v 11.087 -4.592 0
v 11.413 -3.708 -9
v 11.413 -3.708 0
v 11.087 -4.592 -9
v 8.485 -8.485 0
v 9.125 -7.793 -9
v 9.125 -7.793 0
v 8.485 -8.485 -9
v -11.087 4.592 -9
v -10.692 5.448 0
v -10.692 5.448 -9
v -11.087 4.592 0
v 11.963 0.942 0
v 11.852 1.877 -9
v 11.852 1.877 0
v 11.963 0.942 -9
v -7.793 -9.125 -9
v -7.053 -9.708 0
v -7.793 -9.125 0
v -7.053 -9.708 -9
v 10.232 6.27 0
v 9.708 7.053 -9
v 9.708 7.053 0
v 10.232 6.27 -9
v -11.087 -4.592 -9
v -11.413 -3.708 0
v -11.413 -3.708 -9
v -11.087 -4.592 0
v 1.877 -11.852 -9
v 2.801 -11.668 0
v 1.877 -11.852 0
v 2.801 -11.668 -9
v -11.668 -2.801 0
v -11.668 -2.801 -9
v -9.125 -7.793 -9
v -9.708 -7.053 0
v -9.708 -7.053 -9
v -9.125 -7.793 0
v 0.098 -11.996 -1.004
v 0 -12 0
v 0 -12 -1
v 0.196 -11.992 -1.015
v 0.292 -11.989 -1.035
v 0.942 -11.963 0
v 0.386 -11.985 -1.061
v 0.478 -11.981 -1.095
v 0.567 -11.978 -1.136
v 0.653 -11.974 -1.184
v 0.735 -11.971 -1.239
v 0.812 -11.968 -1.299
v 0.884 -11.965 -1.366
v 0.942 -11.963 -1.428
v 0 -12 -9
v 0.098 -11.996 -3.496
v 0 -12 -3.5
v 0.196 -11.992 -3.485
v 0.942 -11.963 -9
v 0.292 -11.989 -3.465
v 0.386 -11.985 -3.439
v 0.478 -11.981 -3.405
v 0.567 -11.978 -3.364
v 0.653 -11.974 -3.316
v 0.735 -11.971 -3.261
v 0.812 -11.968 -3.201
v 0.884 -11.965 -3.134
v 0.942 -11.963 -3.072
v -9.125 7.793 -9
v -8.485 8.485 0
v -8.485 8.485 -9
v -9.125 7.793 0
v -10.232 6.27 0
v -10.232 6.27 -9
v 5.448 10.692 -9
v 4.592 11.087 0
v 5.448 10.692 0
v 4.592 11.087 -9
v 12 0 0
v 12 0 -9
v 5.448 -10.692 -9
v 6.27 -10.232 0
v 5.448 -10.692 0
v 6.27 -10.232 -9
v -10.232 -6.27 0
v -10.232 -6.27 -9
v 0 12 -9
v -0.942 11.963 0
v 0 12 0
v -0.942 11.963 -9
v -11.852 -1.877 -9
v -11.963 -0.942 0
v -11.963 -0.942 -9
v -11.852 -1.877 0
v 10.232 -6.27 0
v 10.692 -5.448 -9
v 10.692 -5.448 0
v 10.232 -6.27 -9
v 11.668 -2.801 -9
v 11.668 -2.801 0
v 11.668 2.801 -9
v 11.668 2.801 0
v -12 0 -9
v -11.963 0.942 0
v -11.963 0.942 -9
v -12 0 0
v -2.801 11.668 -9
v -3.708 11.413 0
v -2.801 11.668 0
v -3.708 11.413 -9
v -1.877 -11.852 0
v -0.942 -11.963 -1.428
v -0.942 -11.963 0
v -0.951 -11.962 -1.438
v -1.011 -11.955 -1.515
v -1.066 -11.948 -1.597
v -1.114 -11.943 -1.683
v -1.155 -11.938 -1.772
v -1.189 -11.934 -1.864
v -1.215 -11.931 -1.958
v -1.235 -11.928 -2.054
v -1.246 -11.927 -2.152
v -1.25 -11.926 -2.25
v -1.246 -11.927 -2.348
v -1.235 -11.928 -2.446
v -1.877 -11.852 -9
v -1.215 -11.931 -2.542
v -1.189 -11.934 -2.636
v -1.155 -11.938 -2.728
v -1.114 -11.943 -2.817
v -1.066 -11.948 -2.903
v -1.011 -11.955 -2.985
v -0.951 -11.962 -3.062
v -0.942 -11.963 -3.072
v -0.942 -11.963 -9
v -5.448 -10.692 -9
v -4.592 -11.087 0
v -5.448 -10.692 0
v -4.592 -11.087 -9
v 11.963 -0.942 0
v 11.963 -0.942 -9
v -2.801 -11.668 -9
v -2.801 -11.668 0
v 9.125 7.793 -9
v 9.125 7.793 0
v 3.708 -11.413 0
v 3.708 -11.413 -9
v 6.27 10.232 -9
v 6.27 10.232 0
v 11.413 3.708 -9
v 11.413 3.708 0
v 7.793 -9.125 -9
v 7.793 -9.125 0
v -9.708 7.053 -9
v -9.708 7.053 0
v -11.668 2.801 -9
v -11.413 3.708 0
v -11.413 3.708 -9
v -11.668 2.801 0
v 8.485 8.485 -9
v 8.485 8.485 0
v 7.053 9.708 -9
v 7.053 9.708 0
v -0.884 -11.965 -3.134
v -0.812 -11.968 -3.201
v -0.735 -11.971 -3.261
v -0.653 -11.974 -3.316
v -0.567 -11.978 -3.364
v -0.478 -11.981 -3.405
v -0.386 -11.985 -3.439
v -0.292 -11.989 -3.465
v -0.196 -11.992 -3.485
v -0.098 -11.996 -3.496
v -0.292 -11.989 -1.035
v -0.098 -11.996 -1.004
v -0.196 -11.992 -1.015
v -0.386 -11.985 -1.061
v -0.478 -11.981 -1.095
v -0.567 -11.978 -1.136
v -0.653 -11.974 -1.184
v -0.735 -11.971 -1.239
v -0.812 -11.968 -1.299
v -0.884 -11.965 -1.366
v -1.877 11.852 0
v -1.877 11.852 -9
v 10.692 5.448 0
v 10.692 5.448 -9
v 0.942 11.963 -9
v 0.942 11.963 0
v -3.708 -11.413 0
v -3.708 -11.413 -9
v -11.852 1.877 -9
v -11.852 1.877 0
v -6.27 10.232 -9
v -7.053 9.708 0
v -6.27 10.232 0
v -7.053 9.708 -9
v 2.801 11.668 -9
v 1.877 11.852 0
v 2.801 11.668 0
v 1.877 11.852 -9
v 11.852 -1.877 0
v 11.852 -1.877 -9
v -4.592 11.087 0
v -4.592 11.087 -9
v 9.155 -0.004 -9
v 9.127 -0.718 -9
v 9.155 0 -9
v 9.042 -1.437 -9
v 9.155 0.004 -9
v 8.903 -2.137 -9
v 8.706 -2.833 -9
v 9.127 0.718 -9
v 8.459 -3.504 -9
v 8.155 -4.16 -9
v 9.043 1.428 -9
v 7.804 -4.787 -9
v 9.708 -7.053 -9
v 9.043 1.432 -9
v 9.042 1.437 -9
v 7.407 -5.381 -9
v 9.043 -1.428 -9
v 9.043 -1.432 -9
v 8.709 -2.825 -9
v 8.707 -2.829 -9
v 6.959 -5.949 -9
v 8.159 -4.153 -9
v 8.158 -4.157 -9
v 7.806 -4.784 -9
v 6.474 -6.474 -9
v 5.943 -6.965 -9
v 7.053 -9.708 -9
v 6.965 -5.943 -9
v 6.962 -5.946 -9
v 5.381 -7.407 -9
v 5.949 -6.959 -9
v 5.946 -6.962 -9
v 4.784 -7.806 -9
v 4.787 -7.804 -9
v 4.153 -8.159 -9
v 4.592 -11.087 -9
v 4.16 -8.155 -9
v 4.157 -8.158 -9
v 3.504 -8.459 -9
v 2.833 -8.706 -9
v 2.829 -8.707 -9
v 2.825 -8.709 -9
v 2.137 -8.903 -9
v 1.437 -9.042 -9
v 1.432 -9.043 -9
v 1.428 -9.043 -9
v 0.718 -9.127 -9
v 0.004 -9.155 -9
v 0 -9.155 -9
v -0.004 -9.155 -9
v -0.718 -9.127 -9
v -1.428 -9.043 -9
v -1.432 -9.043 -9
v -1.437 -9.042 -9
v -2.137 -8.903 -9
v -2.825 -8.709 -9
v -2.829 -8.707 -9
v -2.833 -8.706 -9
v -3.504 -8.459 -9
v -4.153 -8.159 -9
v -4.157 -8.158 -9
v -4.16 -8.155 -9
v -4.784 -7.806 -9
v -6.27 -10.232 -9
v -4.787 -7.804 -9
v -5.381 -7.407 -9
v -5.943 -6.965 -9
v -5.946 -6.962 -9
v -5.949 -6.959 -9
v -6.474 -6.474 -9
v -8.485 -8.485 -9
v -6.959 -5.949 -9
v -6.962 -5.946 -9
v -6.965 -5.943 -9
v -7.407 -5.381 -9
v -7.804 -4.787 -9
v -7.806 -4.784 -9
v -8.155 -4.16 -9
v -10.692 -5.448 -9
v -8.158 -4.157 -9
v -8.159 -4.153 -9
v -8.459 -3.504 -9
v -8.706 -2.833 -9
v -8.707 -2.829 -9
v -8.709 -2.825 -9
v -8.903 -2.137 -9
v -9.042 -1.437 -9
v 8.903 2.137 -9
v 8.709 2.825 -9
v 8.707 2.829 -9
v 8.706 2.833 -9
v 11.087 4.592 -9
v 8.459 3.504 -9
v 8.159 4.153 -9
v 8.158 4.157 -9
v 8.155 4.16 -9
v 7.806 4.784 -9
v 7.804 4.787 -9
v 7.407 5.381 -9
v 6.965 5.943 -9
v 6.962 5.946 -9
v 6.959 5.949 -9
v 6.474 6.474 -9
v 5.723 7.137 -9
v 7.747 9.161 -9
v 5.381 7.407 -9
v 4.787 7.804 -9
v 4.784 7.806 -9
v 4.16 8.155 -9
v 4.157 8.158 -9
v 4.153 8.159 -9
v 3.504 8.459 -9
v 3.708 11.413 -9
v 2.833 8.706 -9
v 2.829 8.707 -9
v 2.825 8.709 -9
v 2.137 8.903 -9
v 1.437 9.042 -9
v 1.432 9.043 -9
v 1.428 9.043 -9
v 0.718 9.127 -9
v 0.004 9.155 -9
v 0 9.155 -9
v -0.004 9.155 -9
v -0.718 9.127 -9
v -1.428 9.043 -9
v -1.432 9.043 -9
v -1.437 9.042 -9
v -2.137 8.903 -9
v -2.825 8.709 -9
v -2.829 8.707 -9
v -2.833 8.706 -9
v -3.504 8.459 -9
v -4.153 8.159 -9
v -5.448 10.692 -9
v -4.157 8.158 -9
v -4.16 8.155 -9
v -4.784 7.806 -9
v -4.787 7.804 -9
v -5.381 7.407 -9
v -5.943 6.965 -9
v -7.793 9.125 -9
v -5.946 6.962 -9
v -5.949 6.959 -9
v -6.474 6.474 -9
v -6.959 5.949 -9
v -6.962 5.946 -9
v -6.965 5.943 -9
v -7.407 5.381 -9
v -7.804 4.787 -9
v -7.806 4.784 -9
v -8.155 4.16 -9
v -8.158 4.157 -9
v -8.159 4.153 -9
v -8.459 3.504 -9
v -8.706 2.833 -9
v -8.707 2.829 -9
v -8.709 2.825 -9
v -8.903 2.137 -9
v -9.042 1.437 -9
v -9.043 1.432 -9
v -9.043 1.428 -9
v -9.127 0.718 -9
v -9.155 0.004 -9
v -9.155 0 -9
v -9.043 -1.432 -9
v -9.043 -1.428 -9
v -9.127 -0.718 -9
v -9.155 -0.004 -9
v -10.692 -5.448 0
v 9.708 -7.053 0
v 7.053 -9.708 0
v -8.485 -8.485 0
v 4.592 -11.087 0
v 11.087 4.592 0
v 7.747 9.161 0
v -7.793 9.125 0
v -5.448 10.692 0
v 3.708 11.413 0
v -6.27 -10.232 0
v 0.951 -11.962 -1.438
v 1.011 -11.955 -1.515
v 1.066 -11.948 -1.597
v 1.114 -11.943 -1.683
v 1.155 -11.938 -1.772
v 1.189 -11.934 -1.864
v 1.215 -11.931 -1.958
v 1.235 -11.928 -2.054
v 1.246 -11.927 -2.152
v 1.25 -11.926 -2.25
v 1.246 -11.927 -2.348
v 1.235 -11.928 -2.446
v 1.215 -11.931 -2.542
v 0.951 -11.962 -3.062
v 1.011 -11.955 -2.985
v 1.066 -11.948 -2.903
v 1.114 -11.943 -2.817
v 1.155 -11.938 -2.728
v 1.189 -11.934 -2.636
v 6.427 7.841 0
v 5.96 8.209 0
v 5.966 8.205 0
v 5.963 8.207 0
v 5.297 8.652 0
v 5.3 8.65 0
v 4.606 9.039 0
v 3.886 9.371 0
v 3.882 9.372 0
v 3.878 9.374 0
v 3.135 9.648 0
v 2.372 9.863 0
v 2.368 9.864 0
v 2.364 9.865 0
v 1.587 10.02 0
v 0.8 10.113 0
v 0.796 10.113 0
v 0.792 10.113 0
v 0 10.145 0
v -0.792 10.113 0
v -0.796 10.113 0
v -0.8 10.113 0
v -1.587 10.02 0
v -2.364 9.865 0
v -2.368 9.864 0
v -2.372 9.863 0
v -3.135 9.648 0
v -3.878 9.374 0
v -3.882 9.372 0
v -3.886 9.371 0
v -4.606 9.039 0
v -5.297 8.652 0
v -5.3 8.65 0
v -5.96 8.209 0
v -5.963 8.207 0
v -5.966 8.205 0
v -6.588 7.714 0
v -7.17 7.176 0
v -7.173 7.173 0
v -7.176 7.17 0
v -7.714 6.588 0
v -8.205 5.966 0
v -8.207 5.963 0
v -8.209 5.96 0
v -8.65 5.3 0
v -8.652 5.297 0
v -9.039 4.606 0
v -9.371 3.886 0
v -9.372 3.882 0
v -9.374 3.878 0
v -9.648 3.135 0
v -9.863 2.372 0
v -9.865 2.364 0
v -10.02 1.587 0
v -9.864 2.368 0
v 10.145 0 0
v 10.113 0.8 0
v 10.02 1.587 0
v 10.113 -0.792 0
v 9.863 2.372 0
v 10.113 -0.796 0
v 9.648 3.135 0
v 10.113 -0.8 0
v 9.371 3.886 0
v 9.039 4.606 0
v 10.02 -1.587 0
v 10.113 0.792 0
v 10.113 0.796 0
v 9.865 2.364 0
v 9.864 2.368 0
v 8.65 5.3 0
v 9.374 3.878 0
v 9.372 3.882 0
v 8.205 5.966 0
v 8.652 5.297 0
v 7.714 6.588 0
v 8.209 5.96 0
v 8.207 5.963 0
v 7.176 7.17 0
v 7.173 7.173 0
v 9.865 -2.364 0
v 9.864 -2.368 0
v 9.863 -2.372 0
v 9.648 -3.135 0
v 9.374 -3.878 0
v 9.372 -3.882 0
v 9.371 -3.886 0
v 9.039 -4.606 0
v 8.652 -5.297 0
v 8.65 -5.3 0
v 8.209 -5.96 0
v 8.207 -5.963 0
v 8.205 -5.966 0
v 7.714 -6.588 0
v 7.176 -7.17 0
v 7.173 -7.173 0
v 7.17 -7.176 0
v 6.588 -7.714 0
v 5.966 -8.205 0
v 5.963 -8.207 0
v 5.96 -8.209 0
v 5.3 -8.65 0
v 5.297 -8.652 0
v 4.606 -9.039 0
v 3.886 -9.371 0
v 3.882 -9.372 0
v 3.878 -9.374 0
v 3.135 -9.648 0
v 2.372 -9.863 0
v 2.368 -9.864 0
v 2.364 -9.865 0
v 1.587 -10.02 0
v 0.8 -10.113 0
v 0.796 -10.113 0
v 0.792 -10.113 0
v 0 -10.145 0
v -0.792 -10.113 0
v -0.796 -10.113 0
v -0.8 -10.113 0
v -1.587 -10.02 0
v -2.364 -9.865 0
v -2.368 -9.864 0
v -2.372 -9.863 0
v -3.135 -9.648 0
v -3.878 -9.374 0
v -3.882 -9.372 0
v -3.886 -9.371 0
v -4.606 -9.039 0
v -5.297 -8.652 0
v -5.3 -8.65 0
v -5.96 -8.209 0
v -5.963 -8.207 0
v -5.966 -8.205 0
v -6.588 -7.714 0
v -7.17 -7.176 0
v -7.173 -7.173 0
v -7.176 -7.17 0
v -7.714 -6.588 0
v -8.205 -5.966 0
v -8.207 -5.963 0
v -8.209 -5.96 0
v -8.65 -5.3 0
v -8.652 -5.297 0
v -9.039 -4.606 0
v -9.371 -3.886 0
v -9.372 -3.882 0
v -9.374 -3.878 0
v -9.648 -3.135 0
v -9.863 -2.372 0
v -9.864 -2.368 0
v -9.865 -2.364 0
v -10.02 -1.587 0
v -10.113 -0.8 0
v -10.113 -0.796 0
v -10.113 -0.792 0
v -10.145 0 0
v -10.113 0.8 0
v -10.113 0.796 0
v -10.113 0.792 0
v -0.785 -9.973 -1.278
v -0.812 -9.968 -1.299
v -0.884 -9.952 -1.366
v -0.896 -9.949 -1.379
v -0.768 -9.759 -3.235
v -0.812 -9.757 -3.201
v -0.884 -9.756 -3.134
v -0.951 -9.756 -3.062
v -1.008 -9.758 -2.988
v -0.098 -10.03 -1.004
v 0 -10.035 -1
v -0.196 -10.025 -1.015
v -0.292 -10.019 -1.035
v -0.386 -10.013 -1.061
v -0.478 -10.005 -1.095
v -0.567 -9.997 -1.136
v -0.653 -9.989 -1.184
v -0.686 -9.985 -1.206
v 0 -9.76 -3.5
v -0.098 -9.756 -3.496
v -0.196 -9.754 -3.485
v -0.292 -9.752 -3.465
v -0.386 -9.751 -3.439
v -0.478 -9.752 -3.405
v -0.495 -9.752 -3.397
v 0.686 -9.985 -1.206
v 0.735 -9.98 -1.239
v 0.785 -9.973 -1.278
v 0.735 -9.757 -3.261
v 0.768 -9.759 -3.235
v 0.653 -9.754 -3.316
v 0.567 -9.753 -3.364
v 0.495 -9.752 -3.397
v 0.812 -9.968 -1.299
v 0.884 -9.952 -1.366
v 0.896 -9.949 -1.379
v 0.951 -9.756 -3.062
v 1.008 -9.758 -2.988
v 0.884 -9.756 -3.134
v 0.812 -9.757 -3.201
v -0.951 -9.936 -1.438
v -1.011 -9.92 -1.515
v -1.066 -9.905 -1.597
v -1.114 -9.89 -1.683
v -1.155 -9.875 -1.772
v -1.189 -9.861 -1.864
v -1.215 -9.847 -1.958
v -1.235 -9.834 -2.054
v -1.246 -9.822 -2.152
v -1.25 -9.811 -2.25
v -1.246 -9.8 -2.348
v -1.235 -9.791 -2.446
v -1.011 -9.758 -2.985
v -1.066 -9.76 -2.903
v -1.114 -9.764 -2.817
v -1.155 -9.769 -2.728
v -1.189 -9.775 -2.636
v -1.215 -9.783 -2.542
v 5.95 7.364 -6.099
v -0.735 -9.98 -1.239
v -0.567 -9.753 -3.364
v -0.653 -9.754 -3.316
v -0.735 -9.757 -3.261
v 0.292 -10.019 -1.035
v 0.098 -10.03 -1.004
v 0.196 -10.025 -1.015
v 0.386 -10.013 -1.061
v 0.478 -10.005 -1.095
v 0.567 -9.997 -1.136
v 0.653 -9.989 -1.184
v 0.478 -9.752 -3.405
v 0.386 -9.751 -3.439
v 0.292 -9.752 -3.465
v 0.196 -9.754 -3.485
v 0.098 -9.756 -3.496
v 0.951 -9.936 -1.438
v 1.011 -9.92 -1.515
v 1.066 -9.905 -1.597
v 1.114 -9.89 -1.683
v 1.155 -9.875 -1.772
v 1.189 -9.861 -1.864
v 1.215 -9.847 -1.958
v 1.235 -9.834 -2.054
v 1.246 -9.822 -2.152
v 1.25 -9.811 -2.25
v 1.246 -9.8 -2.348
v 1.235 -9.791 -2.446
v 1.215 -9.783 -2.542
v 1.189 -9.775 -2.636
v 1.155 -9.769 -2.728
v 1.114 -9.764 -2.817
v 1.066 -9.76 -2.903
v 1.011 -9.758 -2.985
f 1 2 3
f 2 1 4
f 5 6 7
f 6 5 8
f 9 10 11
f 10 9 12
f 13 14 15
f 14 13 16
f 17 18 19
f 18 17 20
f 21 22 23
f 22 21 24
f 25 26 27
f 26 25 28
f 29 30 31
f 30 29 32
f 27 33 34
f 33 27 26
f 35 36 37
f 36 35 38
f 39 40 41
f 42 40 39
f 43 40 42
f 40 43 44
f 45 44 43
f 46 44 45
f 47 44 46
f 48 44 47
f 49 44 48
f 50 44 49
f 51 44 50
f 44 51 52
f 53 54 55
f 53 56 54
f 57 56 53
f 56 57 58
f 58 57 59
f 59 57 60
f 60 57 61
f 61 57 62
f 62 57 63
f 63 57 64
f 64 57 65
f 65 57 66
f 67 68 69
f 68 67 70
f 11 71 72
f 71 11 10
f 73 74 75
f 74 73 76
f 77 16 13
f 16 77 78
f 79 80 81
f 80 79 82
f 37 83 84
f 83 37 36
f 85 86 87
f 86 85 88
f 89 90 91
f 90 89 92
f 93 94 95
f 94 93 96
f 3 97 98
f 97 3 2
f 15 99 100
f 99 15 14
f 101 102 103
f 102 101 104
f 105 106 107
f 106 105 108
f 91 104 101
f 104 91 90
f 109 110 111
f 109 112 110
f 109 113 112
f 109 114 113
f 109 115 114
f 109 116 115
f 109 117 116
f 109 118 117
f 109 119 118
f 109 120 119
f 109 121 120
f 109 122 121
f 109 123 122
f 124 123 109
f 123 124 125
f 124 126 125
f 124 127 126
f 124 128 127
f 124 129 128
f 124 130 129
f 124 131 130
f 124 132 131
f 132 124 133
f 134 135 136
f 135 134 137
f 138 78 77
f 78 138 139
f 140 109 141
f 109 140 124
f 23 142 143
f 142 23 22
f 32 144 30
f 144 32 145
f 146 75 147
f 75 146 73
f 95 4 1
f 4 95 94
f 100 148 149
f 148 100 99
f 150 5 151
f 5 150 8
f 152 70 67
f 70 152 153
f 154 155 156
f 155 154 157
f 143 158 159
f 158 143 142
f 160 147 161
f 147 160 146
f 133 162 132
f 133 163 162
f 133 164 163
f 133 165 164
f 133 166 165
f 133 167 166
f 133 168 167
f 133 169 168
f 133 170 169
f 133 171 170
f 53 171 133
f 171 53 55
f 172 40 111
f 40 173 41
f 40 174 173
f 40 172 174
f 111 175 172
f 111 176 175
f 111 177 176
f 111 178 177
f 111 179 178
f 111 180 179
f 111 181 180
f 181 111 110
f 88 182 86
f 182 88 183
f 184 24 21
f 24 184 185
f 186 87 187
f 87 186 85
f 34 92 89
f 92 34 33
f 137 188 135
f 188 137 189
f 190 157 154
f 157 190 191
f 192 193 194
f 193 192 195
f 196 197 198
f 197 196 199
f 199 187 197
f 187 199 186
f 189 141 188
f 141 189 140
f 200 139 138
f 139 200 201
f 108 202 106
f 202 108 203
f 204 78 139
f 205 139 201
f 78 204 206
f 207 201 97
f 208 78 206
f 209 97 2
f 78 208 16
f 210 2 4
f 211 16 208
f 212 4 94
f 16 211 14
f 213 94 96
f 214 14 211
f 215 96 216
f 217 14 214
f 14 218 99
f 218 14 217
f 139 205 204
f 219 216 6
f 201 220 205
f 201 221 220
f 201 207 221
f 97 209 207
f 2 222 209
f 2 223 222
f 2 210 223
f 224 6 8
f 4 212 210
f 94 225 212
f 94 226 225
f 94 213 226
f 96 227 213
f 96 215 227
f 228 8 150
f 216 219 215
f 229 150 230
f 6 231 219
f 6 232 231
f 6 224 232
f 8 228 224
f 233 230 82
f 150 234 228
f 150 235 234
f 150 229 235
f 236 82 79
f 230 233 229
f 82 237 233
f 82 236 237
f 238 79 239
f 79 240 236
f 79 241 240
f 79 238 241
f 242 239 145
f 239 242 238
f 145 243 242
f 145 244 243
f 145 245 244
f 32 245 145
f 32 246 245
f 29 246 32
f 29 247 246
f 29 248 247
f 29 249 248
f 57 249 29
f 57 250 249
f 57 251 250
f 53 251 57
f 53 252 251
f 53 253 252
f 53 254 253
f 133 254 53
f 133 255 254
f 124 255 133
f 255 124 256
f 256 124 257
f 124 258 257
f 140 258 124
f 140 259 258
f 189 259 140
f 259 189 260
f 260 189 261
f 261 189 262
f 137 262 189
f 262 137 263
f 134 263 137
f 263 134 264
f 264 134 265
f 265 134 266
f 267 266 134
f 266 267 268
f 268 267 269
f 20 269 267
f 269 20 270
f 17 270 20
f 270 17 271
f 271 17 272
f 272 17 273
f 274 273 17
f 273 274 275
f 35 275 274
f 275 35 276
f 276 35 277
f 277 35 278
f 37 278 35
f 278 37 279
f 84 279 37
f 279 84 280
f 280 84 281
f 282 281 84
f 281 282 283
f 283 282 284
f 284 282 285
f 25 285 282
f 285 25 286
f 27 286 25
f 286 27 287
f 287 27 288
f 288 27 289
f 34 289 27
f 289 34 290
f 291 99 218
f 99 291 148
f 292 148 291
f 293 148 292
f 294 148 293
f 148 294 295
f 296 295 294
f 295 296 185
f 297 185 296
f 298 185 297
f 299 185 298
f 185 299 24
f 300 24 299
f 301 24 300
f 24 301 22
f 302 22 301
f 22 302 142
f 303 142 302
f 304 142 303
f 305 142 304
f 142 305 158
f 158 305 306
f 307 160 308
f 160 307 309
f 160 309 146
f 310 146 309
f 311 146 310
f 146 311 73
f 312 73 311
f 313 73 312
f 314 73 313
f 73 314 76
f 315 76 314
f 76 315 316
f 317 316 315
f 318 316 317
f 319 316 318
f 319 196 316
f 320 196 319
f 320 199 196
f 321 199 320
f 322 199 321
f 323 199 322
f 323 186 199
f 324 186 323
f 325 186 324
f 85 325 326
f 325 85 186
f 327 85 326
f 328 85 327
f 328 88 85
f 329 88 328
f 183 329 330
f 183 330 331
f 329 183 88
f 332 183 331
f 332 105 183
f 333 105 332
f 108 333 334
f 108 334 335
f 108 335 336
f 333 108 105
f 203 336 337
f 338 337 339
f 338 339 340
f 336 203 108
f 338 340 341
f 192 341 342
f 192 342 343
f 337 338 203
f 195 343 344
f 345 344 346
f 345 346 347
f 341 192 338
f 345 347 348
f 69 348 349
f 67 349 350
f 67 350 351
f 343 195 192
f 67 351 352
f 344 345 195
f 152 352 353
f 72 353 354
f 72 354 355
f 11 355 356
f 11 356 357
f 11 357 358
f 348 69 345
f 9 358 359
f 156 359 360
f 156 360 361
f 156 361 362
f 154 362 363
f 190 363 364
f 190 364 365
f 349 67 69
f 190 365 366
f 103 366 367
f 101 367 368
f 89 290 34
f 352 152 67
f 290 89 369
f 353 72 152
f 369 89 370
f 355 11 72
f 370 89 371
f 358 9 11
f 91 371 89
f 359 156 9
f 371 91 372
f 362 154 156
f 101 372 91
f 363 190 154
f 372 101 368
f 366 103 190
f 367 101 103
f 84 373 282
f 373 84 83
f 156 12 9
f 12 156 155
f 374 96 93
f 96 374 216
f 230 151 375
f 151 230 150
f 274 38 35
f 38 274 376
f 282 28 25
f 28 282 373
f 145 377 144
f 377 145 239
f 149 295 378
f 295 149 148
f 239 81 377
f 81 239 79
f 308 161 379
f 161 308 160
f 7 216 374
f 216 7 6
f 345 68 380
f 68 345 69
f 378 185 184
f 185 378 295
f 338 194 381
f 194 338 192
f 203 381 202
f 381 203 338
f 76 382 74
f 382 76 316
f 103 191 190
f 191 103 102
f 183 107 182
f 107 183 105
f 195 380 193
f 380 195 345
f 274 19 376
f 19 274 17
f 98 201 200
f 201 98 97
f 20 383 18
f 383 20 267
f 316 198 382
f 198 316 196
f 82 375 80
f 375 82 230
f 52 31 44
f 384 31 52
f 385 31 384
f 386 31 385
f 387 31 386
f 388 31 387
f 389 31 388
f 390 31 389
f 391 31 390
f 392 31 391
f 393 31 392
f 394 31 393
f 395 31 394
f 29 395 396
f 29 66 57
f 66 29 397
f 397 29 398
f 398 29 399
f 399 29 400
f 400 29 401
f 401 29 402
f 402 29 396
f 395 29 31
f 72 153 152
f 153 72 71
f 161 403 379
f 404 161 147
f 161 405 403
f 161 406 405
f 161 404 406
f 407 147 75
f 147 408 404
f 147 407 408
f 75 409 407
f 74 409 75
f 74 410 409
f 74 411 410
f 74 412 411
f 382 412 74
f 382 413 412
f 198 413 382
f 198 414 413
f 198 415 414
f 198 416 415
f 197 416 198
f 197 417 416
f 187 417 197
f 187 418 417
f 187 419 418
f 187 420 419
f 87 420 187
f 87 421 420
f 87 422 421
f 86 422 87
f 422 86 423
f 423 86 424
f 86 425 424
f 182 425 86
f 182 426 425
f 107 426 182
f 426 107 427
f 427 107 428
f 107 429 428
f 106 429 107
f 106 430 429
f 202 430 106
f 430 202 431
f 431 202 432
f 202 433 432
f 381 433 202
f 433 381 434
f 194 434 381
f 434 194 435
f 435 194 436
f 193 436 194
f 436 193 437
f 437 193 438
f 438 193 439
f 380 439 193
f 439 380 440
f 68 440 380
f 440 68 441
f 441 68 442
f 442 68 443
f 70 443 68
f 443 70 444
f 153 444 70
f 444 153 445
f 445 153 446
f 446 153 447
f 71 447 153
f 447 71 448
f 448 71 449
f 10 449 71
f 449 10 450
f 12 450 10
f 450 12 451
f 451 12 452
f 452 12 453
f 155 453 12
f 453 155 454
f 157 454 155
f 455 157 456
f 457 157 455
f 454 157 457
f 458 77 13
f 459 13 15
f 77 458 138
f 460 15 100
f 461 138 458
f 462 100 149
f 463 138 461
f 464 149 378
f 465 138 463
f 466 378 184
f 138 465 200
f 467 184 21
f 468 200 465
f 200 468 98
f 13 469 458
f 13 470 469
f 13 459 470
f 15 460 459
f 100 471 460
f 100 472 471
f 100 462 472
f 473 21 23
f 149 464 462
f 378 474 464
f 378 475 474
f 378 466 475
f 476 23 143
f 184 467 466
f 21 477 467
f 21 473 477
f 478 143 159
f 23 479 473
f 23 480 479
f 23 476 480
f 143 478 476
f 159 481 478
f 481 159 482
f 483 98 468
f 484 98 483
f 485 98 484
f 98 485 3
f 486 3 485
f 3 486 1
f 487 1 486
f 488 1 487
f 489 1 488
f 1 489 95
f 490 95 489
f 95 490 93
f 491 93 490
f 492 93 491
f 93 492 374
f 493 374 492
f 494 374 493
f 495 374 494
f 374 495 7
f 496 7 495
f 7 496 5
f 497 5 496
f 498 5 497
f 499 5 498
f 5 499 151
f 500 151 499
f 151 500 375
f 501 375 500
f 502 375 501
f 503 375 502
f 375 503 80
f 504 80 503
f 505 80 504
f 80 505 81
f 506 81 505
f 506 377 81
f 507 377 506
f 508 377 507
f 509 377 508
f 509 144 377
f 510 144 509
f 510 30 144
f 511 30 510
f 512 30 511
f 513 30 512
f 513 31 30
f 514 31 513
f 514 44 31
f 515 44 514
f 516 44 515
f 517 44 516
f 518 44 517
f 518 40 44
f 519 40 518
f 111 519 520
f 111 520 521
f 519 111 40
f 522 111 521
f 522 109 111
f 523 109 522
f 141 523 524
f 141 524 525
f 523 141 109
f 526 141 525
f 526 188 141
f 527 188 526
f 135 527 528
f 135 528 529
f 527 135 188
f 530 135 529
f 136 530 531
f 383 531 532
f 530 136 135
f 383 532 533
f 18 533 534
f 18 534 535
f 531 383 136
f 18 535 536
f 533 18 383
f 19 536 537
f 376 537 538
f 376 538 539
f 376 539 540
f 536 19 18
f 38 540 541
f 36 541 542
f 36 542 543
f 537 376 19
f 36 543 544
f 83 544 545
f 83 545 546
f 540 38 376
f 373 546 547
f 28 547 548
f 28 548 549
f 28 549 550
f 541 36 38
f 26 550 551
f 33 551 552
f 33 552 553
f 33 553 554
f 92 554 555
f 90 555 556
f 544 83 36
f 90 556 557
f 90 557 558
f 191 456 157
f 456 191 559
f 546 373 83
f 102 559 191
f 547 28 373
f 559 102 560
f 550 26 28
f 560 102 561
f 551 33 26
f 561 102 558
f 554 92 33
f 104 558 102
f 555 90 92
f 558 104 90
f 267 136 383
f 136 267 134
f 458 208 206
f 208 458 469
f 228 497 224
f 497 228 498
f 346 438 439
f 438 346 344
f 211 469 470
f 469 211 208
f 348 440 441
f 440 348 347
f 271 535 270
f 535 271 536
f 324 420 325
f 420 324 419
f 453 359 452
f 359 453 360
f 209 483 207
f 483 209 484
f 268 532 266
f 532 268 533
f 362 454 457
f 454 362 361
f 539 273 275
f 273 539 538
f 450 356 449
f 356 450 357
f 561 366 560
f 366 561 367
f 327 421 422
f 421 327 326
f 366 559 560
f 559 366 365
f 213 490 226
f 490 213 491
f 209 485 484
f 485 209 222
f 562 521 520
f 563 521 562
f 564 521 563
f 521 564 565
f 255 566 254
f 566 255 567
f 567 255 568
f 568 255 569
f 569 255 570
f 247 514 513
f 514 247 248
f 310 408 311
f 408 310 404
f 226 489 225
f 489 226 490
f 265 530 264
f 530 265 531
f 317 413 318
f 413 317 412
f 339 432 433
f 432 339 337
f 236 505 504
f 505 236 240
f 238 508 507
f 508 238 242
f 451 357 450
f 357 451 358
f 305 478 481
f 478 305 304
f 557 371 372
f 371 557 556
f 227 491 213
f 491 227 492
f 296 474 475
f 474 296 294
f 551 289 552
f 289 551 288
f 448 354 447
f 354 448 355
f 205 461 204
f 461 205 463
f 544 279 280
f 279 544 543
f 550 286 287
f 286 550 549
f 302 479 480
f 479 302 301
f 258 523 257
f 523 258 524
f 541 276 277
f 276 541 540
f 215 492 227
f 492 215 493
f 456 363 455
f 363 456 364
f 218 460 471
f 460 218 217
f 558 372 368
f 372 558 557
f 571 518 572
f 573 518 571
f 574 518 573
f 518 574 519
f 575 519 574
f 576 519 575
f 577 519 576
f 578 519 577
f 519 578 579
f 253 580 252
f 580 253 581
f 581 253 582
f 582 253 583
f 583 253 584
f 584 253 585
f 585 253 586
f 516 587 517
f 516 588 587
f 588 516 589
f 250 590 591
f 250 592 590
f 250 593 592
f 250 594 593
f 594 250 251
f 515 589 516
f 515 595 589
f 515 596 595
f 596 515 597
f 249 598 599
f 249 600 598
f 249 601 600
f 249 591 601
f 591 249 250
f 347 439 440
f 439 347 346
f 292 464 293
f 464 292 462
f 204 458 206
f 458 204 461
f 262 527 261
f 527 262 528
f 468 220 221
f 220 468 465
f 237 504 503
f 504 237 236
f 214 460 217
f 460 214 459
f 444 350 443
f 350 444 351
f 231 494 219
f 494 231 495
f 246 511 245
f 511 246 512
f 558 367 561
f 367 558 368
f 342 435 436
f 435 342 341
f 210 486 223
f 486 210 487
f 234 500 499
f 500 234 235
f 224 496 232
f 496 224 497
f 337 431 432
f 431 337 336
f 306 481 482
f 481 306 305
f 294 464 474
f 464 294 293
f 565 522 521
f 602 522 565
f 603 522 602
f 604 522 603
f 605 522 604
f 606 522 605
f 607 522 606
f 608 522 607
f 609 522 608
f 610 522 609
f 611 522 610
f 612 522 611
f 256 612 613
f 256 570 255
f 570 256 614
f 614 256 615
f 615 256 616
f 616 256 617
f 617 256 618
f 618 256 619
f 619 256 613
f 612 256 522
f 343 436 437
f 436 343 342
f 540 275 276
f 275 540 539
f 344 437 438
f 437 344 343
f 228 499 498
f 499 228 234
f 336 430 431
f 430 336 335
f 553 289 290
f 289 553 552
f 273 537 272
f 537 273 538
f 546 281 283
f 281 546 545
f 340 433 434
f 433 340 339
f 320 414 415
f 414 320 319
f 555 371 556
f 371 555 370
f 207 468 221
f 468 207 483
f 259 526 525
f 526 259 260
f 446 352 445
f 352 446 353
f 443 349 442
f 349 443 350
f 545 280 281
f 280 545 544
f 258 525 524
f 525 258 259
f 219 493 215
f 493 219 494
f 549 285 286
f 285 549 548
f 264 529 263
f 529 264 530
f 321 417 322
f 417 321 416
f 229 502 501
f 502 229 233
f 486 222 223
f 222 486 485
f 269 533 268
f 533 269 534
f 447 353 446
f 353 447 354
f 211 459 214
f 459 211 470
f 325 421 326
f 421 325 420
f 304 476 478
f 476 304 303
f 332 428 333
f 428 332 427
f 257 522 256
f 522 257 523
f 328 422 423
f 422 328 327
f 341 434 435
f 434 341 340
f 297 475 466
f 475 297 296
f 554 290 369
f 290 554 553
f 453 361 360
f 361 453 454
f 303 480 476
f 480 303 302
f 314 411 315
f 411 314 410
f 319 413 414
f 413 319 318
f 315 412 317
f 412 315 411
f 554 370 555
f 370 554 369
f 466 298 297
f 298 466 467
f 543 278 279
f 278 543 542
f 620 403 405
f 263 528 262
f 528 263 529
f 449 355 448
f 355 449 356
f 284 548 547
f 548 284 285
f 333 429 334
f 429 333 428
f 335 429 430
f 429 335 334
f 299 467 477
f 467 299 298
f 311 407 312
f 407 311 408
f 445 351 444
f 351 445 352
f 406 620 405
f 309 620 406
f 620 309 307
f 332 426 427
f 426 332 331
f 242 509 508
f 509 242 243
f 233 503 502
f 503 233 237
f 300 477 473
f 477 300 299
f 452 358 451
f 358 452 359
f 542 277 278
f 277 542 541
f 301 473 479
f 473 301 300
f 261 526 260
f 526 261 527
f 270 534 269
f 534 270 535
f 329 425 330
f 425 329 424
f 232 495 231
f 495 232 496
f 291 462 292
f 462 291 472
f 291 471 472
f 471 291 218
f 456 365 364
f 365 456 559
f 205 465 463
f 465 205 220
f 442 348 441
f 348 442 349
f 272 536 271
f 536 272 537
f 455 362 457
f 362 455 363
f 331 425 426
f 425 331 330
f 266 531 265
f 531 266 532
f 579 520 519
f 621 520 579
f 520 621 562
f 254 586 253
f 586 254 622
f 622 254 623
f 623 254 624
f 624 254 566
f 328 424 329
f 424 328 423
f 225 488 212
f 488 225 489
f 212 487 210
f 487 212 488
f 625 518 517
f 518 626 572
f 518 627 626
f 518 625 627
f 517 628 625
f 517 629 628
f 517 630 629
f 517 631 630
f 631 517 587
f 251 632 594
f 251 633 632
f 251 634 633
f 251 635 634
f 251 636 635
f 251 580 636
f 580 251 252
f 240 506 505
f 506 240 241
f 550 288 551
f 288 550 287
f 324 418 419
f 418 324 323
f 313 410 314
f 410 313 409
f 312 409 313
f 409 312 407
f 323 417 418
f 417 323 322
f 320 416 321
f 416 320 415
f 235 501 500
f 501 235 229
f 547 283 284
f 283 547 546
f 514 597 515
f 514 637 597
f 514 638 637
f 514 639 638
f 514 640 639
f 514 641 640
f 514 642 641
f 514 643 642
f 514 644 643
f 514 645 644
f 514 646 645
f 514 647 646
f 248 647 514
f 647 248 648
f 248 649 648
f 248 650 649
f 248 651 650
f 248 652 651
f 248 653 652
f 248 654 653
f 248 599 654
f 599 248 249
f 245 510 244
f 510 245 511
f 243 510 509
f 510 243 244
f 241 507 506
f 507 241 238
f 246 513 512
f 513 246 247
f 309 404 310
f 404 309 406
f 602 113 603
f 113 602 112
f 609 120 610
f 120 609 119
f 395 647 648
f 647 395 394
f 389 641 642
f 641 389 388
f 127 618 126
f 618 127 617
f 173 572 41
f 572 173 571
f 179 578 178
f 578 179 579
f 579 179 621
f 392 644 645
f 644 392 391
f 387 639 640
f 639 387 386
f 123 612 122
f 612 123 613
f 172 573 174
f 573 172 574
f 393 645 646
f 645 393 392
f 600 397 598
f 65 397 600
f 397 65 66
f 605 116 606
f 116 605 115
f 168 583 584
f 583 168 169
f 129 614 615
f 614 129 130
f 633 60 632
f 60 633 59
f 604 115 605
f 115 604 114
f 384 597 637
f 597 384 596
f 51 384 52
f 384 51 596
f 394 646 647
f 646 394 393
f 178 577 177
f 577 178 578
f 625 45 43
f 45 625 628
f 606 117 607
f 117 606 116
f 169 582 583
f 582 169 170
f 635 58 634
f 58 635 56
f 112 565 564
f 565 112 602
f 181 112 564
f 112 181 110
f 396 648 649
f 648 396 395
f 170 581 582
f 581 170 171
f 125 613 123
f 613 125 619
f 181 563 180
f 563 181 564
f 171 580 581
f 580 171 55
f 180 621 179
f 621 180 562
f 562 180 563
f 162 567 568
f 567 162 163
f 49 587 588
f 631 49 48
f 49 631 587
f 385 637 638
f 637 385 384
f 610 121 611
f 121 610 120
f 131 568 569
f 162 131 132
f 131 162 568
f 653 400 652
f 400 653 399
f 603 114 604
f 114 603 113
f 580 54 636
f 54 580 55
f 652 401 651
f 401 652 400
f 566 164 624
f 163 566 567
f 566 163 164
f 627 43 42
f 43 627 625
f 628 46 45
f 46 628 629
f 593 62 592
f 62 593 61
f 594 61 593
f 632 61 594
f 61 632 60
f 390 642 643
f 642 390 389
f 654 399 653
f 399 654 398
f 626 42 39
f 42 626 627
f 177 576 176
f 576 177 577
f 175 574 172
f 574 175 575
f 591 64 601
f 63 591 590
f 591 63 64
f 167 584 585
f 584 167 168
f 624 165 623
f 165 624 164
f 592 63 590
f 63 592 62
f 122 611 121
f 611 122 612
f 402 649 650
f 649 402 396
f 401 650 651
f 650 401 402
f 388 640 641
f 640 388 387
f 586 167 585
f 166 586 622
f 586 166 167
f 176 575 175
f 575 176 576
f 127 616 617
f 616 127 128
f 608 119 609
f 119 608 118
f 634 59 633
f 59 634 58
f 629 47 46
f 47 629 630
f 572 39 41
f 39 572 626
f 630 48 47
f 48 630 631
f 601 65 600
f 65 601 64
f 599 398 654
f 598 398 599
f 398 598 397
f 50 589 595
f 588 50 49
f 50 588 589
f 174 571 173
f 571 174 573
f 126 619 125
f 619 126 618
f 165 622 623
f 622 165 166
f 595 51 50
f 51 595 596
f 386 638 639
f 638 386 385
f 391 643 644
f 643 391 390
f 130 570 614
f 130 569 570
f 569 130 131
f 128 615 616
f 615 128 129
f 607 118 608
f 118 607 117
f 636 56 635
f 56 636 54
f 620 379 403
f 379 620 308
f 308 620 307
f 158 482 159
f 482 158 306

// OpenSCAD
eps = 0.05;
eps2 = 2 * eps;
epsz = [0, 0, -eps];

$fn = 80;

d_outer = 13;
d_outer_top = 13.8;
h = 13.5;
h_cone = 7.5;

d_screw = 2.5;
screw_y = h/2;

d_antenna = 10;

tol = 0.3;

chamfer = 1;
slot_w = 1;


d_guide_top = 18+tol;
d_guide_bottom = 20+tol;
d_guide_outside = 24;

//plug();
//translate([d_outer*1.5, 0, 0]) 
mirror([0, 0, 1]) drill_guide();

module plug() {
    difference() {
        union() {
            cylinder(d=d_outer-tol, h=h);
            cylinder(d1=d_outer_top-tol, d2=d_outer-tol, h=h_cone);
        }
        
        translate(epsz) cylinder(d=d_antenna+tol, h=h+eps2);

        translate([0, 0, screw_y]) rotate([90, 0, 0]) cylinder(d=d_screw, h=d_outer);
    }
}

module drill_guide() {
    rim = 1;
    hole_y = rim + d_screw/2;
    guide_h = h - screw_y + hole_y;
    
    w = d_outer/sqrt(2)+0.5;
    
    
    difference() {
        cylinder(d=d_guide_outside, h=guide_h);
        translate(epsz) cylinder(d1=d_guide_bottom, d2=d_guide_top, h=guide_h+eps2);
        translate([0, 0, hole_y]) rotate([90, 0, 0]) cylinder(d=d_screw, h=d_outer);
        rotate([0, 0, 45]) translate([-w/2, -w/2, -eps]) cube([w, w, guide_h+eps2]);
        rotate([0, 0, 45]) translate(epsz) cube([d_outer, slot_w, guide_h+eps2]);
    }
}
